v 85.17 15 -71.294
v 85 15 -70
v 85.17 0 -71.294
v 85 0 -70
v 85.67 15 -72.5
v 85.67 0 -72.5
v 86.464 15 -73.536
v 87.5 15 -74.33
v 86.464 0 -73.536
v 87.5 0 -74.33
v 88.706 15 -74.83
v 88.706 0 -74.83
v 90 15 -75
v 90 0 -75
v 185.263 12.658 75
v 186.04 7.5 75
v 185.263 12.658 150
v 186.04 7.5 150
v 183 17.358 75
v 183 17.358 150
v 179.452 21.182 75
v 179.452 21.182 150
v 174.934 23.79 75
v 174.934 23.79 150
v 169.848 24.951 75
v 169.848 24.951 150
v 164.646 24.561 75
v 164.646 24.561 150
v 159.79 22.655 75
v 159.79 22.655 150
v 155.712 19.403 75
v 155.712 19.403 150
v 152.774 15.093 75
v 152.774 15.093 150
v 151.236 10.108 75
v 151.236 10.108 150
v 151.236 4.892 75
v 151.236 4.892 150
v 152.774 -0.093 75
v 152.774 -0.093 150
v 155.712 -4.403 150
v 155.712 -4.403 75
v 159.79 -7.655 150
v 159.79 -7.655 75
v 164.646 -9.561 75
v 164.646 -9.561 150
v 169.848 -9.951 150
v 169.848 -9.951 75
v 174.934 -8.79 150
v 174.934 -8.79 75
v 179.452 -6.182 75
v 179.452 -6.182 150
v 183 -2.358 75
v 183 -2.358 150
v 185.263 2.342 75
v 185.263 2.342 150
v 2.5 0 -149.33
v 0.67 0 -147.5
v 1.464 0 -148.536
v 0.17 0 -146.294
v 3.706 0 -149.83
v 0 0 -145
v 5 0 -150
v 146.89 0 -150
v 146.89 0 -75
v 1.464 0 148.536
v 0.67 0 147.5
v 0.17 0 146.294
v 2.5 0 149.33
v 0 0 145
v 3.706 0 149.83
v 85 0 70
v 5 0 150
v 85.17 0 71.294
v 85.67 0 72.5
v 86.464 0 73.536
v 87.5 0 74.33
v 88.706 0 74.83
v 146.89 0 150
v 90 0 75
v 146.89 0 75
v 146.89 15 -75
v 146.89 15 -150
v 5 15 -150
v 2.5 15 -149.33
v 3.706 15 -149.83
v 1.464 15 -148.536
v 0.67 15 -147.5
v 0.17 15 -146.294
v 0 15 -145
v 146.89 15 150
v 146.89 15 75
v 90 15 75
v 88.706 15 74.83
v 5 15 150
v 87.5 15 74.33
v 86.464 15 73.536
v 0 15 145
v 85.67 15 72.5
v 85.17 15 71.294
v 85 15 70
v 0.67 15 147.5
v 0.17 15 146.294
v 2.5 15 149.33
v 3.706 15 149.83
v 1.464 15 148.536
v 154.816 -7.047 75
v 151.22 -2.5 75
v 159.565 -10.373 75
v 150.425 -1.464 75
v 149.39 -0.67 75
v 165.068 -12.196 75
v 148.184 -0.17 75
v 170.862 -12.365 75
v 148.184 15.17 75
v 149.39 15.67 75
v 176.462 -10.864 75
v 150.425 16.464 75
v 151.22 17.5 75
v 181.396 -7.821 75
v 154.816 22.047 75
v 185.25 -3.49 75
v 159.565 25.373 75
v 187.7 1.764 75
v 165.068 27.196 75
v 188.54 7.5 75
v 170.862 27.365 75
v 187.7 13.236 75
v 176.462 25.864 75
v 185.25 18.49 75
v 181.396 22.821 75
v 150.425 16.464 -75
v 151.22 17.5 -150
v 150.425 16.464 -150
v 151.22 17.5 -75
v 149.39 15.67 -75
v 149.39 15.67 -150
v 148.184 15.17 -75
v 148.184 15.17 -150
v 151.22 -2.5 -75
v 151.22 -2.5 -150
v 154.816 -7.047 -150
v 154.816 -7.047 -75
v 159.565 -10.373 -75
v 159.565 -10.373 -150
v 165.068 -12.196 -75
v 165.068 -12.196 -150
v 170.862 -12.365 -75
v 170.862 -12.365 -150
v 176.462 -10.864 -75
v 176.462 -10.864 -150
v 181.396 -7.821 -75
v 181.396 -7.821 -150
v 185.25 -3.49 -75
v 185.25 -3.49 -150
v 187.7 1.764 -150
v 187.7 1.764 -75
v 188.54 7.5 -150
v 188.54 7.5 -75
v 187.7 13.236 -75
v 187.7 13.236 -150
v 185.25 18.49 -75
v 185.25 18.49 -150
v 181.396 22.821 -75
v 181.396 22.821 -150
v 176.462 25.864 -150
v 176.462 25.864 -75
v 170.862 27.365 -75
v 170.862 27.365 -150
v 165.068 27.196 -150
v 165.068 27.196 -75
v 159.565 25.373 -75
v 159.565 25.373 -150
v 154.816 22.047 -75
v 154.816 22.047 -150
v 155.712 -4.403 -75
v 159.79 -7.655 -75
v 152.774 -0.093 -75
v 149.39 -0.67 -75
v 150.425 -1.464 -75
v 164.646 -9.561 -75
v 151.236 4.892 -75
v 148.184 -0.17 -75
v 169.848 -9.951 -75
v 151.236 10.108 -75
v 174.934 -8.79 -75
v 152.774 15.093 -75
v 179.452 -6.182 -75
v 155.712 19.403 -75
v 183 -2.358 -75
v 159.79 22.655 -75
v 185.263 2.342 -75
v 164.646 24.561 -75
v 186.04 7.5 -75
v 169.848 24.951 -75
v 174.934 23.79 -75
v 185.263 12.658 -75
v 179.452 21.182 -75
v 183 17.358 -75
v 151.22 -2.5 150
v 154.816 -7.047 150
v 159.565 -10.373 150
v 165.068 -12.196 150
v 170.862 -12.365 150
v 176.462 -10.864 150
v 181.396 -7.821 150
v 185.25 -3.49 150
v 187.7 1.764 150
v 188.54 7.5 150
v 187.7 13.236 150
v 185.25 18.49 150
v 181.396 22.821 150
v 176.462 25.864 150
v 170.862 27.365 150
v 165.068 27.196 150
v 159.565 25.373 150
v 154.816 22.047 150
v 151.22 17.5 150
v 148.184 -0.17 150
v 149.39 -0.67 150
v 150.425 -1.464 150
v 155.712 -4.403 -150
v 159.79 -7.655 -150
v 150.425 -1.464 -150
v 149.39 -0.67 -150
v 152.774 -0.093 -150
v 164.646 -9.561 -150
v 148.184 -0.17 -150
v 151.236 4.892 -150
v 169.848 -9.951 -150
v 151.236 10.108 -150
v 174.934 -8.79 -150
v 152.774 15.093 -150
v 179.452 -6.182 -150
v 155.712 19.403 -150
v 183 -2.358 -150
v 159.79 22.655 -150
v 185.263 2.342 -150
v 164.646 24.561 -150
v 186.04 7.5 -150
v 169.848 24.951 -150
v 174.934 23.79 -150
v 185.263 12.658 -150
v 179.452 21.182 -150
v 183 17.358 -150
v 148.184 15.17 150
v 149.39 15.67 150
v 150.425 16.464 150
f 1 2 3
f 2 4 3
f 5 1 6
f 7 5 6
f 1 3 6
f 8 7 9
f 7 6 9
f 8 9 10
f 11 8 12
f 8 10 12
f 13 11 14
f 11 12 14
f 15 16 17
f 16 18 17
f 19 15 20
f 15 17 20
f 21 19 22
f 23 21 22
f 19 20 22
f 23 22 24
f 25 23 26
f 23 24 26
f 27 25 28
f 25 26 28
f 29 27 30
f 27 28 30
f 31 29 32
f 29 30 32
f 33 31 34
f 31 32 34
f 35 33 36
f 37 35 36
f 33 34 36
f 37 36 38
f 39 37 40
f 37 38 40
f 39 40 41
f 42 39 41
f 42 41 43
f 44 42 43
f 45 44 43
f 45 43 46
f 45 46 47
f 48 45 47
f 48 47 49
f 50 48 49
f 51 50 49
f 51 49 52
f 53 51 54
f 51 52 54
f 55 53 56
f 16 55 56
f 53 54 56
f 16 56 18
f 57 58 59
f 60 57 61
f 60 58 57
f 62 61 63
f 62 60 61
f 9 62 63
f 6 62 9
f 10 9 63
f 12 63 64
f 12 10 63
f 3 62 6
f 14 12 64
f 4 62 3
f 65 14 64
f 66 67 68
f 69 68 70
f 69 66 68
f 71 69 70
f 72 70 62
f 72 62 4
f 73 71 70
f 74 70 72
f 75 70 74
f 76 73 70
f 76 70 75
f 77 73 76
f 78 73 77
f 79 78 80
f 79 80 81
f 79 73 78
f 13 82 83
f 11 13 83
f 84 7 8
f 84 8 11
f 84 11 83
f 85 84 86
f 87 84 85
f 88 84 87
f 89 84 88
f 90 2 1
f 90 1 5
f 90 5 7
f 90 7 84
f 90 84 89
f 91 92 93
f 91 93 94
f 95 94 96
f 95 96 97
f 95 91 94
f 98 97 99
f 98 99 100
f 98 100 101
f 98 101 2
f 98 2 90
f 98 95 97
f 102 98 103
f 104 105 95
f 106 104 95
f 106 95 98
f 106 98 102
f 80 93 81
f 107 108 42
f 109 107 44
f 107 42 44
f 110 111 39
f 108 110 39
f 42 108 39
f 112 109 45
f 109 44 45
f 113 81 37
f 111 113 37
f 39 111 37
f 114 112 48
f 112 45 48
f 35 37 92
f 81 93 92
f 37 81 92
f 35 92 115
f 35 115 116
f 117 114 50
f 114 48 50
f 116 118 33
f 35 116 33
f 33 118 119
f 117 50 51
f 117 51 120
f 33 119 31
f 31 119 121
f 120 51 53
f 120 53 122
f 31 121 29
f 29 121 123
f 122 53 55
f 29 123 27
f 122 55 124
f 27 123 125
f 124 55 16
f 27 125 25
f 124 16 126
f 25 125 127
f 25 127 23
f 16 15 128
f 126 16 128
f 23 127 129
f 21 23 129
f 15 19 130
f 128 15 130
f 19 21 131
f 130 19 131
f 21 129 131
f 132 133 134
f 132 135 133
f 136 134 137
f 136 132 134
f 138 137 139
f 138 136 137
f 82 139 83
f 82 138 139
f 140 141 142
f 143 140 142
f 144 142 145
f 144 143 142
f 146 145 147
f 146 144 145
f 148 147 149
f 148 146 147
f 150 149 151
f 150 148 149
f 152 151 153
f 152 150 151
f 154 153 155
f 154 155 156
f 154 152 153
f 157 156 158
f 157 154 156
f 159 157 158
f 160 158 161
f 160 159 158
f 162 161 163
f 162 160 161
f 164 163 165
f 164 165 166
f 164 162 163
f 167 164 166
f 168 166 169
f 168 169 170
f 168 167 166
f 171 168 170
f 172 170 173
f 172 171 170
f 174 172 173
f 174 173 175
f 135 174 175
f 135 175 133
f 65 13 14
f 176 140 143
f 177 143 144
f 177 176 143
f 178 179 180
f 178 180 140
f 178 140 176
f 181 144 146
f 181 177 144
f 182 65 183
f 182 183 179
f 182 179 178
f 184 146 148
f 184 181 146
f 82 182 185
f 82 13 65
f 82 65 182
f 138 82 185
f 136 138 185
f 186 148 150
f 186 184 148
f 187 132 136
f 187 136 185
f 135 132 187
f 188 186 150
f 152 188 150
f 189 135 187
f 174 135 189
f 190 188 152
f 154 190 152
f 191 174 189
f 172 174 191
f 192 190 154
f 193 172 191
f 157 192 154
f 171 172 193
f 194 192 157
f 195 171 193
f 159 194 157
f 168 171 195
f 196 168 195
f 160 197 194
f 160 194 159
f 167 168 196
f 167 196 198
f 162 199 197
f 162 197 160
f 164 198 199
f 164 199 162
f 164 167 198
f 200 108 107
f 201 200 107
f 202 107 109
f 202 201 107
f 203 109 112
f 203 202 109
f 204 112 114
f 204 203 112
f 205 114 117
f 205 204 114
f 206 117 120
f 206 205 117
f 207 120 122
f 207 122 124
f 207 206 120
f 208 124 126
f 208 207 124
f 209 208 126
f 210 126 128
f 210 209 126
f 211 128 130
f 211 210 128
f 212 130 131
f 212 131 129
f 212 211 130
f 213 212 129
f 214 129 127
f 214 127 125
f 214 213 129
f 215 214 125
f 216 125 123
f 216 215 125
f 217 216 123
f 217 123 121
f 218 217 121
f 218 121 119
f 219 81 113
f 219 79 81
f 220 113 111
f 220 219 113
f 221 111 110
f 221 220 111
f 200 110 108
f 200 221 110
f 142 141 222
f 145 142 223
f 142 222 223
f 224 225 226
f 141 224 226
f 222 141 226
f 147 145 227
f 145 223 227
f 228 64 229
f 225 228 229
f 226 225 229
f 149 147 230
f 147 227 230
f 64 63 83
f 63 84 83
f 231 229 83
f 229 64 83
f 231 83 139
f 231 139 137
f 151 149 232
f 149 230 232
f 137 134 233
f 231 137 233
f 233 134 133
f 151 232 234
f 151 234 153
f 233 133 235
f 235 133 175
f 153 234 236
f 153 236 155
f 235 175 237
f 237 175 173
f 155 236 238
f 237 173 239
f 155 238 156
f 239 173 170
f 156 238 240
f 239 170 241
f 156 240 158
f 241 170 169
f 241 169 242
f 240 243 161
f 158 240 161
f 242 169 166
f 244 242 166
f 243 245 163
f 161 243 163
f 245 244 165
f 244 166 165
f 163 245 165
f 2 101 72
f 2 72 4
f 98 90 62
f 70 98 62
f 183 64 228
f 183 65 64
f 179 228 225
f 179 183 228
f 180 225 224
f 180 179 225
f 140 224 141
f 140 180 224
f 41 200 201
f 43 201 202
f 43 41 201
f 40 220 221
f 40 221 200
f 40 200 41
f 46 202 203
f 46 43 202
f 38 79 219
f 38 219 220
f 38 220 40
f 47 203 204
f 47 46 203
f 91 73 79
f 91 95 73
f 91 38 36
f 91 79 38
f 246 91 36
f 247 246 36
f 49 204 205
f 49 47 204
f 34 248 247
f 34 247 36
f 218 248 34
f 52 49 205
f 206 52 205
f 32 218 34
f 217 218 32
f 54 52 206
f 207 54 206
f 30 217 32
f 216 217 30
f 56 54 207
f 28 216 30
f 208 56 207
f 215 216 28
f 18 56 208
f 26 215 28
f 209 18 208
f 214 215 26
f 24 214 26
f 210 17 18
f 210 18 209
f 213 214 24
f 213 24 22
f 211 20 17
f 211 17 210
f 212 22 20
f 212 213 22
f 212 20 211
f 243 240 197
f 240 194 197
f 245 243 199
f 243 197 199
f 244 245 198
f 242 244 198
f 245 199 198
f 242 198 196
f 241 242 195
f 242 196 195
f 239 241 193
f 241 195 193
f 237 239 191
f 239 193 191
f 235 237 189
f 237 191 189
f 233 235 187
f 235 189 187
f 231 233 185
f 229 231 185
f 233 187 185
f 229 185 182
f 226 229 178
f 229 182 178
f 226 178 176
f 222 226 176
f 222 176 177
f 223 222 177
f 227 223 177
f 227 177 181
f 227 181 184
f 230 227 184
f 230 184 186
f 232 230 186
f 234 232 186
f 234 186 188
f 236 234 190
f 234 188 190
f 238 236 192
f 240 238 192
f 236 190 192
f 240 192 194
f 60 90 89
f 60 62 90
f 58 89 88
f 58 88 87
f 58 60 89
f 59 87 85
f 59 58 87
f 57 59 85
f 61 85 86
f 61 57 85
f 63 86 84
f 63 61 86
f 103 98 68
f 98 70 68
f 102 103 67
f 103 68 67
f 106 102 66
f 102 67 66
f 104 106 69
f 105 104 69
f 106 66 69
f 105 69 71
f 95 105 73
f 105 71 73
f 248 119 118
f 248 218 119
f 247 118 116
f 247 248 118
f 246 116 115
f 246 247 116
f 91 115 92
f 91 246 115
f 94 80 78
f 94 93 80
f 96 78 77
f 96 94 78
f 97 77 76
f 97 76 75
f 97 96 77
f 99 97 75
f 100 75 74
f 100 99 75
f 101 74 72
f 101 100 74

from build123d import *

# Parameters (mm, degrees)
BOSS_EXTRUDE2_DEPTH = 150
SKETCH4_W           = 110
SKETCH4_H           = 150
CUT_EXTRUDE1_DEPTH  = 150
FILLET1_R           = 5
SKETCH5_R           = 17.5
CUT_EXTRUDE2_DEPTH  = 378


with BuildPart() as part:
    # Sketch3 → Boss-Extrude2 (new, symmetric)
    with BuildSketch(Plane.XY):
        with BuildLine():
            Line((0, 0), (150, 0))
            ThreePointArc((150, 0), (188.540496218, 7.5), (150, 15))
            Line((150, 15), (0, 15))
            Line((0, 15), (0, 0))
        make_face()
    extrude(amount=BOSS_EXTRUDE2_DEPTH, both=True)

    # Sketch4 → Cut-Extrude1 (cut, symmetric)
    with BuildSketch(Plane(origin=(0, 0, 0), x_dir=(1, 0, 0), z_dir=(0, 1, 0))):
        with Locations((140, 0)):
            Rectangle(SKETCH4_W, SKETCH4_H)
    extrude(amount=CUT_EXTRUDE1_DEPTH, both=True, mode=Mode.SUBTRACT)

    # Fillet1
    fillet1_edges = [part.edges().sort_by_distance(p)[0] for p in [
        (150, 15, -112.5),
        (150, 0, -112.5),
        (85, 7.5, 75),
        (85, 7.5, -75),
        (0, 7.5, 150),
        (0, 7.5, -150),
        (150, 15, 112.5),
        (150, 0, 112.5),
    ]]
    fillet(fillet1_edges, radius=FILLET1_R)

    # Sketch5 → Cut-Extrude2 (cut, symmetric)
    with BuildSketch(Plane.XY.offset(150)):
        with Locations((168.540496218, 7.5)):
            Circle(SKETCH5_R)
    extrude(amount=CUT_EXTRUDE2_DEPTH, both=True, mode=Mode.SUBTRACT)


solid = part.part
